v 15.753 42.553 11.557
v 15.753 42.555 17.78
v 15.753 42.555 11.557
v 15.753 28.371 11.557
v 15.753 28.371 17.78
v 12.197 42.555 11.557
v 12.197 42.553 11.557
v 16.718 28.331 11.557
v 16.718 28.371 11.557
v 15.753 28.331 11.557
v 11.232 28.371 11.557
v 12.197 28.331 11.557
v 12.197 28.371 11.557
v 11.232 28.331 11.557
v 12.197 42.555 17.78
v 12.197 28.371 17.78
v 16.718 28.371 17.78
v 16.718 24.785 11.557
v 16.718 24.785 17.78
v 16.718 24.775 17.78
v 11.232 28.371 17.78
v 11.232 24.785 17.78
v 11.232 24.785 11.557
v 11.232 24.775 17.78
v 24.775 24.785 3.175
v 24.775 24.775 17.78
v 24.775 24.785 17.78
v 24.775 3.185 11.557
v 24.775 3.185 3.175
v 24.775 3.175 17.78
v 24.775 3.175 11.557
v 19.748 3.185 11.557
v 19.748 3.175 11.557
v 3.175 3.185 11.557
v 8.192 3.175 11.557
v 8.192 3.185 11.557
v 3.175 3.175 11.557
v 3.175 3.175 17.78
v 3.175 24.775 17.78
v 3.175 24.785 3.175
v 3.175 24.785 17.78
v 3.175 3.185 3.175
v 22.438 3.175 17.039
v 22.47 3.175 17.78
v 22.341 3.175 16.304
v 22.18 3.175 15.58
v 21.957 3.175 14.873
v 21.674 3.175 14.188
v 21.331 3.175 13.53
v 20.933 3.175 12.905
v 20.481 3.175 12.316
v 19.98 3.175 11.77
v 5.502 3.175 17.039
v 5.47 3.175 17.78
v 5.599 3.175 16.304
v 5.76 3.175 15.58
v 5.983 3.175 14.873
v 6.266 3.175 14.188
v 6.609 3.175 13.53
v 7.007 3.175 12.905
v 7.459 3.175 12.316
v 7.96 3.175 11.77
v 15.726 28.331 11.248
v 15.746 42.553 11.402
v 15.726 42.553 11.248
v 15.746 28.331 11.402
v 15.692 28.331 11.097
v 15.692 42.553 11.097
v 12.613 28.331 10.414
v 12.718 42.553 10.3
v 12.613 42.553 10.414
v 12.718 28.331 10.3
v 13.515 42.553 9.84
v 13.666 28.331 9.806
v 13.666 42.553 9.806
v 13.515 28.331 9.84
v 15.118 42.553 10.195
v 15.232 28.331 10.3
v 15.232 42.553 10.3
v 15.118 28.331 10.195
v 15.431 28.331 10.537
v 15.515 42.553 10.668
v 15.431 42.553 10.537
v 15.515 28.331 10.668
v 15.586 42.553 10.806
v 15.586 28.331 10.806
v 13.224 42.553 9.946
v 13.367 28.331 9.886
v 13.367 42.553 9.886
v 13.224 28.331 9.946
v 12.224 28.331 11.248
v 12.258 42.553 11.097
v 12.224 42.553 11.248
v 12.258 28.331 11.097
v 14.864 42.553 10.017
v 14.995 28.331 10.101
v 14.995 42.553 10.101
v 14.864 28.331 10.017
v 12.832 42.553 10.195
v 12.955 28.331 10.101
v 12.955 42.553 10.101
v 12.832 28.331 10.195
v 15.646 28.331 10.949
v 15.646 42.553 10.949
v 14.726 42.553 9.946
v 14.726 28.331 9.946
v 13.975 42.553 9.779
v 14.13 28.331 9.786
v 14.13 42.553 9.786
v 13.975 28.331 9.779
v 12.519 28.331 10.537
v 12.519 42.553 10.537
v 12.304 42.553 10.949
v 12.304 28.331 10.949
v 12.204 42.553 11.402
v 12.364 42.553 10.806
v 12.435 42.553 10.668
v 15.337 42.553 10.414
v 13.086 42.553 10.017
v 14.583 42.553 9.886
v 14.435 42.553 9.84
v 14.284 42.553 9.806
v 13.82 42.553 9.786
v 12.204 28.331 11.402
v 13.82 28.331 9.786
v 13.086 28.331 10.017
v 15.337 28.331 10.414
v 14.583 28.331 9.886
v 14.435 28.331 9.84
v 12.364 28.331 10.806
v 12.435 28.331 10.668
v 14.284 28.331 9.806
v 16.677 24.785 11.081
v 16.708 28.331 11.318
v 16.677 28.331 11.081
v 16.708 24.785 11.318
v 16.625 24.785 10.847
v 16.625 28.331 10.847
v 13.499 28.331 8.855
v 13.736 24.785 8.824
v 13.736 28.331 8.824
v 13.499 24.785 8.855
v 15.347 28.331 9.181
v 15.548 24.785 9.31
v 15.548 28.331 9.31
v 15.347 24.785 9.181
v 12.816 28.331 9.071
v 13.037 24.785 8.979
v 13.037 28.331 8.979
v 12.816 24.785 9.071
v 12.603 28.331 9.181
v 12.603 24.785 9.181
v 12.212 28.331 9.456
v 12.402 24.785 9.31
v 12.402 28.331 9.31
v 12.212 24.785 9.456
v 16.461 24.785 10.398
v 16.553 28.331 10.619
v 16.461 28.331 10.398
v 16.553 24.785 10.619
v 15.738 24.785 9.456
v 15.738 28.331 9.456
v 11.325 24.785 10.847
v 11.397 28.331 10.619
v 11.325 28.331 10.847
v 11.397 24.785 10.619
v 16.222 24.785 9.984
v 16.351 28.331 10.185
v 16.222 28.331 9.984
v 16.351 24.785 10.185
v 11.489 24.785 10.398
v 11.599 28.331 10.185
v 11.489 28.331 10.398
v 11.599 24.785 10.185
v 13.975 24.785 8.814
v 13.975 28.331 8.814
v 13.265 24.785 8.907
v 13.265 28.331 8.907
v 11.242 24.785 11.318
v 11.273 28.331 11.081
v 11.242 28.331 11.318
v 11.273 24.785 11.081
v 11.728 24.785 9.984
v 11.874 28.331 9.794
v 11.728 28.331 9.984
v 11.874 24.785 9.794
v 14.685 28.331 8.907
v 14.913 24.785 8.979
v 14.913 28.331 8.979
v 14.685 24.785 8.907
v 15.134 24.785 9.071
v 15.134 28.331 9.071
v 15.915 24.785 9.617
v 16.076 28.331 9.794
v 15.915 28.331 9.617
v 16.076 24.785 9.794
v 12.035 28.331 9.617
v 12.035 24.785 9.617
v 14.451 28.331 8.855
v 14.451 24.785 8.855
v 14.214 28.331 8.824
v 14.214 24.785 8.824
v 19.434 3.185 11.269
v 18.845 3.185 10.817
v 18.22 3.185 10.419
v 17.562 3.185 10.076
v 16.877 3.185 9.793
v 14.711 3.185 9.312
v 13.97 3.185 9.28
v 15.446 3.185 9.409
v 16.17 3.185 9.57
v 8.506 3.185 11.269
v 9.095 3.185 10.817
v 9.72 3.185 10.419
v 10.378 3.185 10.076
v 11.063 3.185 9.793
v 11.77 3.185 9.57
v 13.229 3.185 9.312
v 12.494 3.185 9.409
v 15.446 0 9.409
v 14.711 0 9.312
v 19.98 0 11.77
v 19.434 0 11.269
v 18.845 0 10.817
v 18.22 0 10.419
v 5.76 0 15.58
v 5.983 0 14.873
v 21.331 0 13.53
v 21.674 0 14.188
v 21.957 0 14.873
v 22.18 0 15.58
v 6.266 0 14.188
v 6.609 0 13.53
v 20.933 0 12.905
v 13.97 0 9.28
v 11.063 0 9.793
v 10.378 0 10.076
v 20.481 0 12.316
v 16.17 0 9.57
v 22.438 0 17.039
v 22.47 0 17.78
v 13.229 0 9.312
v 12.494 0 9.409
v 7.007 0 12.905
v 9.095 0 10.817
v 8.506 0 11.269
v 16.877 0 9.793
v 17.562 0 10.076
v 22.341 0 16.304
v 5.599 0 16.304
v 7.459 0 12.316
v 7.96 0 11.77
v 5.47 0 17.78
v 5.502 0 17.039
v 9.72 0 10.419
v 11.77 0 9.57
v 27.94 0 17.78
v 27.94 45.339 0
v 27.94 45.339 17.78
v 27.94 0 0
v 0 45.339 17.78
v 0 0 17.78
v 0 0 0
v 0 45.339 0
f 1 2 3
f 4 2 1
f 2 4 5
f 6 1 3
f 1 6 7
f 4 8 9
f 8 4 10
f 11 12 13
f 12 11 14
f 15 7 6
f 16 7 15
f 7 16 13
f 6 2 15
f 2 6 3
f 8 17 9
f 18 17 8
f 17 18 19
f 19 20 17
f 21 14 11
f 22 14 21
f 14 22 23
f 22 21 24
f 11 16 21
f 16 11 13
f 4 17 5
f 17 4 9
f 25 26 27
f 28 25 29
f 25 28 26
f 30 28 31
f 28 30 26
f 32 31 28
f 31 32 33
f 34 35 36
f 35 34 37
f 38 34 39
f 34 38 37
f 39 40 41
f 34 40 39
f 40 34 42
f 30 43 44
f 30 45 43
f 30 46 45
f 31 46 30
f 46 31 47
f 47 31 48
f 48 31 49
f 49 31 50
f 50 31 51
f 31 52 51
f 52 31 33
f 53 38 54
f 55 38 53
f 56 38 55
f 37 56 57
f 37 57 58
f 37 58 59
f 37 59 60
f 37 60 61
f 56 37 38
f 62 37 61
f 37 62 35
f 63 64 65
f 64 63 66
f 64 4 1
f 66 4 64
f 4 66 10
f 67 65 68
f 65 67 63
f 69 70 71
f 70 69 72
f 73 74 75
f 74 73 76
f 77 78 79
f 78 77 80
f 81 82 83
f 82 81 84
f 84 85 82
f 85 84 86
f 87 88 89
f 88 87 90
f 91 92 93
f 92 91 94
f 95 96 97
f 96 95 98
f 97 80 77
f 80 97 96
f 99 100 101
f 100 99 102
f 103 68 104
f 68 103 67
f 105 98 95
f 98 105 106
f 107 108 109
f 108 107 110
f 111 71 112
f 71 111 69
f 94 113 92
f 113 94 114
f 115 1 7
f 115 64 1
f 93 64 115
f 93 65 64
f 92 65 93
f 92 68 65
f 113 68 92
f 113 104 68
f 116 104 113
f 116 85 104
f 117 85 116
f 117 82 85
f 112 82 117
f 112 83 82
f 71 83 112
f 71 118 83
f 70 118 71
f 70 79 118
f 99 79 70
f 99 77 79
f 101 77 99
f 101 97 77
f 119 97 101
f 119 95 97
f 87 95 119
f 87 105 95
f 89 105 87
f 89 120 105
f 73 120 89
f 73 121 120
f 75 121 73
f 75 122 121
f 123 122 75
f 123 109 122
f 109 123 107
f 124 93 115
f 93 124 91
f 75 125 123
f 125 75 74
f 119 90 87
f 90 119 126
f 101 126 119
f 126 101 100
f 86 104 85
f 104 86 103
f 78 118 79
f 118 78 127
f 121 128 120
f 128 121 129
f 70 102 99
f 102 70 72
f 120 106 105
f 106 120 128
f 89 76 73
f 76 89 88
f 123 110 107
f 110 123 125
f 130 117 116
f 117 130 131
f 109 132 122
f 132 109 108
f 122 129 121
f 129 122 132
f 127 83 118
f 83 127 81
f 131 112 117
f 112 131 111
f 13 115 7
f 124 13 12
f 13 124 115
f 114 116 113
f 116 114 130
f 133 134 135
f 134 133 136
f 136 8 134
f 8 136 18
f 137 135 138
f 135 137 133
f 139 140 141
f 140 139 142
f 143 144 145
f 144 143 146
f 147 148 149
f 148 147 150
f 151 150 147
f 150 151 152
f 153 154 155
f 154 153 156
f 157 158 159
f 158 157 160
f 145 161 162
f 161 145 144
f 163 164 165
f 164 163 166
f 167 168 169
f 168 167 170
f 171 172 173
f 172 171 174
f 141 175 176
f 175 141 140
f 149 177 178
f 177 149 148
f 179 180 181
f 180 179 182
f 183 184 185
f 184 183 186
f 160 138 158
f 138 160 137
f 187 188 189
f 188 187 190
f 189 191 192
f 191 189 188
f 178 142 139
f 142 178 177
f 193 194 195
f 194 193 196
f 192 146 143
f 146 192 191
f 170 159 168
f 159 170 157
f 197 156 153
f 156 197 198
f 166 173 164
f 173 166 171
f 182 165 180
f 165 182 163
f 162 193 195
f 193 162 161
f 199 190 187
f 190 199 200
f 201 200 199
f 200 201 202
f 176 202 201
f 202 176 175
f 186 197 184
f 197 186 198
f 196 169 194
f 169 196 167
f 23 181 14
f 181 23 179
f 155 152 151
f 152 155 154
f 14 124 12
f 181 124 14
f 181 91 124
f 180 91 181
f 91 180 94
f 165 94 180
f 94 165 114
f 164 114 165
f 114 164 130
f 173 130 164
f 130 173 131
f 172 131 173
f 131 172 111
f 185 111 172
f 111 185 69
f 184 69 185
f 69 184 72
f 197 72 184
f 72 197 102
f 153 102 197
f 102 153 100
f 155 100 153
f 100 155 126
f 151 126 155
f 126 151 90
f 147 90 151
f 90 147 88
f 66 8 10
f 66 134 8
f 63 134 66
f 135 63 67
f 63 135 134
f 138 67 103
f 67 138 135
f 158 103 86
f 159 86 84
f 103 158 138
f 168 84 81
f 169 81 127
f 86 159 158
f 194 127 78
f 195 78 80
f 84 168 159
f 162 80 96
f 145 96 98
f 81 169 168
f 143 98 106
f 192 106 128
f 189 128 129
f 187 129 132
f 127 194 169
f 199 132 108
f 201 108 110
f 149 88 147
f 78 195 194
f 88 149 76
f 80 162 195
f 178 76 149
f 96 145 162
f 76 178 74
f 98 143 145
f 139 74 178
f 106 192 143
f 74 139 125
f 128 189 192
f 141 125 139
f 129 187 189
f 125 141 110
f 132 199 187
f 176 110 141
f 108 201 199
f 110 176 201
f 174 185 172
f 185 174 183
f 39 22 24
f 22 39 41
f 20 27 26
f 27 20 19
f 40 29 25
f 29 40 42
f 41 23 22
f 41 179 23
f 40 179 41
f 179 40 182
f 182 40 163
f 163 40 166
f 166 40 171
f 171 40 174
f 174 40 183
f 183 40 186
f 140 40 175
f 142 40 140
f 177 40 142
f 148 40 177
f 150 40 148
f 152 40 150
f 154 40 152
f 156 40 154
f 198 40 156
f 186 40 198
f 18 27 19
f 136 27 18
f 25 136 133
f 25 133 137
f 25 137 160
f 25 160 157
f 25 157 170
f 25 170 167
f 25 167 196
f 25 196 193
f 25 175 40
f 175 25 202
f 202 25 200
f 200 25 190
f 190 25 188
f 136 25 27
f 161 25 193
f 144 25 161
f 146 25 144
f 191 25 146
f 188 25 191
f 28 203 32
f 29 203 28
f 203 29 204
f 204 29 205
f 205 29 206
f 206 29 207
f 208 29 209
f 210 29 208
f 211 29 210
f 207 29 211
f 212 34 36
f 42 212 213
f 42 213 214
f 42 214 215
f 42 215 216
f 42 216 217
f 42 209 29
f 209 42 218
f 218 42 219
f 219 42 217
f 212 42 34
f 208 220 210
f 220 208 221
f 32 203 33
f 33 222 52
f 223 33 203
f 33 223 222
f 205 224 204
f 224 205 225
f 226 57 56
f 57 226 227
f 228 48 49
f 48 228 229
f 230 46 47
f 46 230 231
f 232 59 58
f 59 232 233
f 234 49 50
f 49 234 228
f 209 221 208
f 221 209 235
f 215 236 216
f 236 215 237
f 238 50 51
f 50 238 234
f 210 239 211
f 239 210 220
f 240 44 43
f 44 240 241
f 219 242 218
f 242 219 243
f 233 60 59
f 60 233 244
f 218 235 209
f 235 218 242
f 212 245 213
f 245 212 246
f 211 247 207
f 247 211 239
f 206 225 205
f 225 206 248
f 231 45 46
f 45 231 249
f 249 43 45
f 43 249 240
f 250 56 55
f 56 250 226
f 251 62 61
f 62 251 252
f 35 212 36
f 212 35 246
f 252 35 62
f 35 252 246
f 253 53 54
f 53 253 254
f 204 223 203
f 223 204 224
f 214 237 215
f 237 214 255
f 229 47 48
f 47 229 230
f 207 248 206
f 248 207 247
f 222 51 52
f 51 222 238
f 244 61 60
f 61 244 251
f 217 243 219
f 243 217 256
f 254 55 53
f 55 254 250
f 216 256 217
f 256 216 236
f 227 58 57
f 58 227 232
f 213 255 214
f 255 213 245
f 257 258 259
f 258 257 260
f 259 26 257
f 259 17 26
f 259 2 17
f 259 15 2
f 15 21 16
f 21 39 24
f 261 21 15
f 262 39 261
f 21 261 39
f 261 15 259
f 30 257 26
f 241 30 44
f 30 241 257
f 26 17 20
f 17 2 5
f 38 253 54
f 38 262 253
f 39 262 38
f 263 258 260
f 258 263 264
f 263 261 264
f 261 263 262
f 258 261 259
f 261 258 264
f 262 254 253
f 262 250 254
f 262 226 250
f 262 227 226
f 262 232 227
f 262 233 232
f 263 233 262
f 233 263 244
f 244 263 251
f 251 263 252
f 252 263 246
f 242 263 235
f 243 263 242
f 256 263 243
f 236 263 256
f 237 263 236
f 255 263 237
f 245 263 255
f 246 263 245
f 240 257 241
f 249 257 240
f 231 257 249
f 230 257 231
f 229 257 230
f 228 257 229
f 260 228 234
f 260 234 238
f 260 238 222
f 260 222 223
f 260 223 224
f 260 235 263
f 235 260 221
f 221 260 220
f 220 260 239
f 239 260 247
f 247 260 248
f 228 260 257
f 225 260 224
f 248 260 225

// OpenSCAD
p=3.175;
bx=21.59;
by=38.989;
bz=14.605;

difference() {
	cube([bx+2*p,by+2*p,bz+p]);
	union() {
		translate([10.8+p,21.6+p,8.382+p]) {
			union() {
				translate([-1.778,3.556,0]) {
					cube([3.556,14.224,30]);
				}
				translate([-2.7432,0,0]) {
					cube([5.4864,3.596,30]);
				}
				translate([-10.8,-21.6,0]) {
					cube([21.6,21.6,30]);
				}
	
				translate([0,3.554,0]) {
					rotate([-90,0.0]) {
						cylinder(h=14.224, r=1.778,$fa=5, $fs=0.1);
					}
				}
				rotate([-90,0,0]) {
					cylinder(h=3.556, r=2.7432,$fa=5, $fs=0.1);
				}
				translate([-10.8,-21.59,-8.382]) {
					cube([21.6,21.6,14.605]);
				}
			}
		}
		translate([bx/2+p,5,bz+p]){
			rotate([90, 0, 0]) {
				cylinder(h=10, r=8.5, ,$fa=5, $fs=0.1);
			}
		}
	}
};
